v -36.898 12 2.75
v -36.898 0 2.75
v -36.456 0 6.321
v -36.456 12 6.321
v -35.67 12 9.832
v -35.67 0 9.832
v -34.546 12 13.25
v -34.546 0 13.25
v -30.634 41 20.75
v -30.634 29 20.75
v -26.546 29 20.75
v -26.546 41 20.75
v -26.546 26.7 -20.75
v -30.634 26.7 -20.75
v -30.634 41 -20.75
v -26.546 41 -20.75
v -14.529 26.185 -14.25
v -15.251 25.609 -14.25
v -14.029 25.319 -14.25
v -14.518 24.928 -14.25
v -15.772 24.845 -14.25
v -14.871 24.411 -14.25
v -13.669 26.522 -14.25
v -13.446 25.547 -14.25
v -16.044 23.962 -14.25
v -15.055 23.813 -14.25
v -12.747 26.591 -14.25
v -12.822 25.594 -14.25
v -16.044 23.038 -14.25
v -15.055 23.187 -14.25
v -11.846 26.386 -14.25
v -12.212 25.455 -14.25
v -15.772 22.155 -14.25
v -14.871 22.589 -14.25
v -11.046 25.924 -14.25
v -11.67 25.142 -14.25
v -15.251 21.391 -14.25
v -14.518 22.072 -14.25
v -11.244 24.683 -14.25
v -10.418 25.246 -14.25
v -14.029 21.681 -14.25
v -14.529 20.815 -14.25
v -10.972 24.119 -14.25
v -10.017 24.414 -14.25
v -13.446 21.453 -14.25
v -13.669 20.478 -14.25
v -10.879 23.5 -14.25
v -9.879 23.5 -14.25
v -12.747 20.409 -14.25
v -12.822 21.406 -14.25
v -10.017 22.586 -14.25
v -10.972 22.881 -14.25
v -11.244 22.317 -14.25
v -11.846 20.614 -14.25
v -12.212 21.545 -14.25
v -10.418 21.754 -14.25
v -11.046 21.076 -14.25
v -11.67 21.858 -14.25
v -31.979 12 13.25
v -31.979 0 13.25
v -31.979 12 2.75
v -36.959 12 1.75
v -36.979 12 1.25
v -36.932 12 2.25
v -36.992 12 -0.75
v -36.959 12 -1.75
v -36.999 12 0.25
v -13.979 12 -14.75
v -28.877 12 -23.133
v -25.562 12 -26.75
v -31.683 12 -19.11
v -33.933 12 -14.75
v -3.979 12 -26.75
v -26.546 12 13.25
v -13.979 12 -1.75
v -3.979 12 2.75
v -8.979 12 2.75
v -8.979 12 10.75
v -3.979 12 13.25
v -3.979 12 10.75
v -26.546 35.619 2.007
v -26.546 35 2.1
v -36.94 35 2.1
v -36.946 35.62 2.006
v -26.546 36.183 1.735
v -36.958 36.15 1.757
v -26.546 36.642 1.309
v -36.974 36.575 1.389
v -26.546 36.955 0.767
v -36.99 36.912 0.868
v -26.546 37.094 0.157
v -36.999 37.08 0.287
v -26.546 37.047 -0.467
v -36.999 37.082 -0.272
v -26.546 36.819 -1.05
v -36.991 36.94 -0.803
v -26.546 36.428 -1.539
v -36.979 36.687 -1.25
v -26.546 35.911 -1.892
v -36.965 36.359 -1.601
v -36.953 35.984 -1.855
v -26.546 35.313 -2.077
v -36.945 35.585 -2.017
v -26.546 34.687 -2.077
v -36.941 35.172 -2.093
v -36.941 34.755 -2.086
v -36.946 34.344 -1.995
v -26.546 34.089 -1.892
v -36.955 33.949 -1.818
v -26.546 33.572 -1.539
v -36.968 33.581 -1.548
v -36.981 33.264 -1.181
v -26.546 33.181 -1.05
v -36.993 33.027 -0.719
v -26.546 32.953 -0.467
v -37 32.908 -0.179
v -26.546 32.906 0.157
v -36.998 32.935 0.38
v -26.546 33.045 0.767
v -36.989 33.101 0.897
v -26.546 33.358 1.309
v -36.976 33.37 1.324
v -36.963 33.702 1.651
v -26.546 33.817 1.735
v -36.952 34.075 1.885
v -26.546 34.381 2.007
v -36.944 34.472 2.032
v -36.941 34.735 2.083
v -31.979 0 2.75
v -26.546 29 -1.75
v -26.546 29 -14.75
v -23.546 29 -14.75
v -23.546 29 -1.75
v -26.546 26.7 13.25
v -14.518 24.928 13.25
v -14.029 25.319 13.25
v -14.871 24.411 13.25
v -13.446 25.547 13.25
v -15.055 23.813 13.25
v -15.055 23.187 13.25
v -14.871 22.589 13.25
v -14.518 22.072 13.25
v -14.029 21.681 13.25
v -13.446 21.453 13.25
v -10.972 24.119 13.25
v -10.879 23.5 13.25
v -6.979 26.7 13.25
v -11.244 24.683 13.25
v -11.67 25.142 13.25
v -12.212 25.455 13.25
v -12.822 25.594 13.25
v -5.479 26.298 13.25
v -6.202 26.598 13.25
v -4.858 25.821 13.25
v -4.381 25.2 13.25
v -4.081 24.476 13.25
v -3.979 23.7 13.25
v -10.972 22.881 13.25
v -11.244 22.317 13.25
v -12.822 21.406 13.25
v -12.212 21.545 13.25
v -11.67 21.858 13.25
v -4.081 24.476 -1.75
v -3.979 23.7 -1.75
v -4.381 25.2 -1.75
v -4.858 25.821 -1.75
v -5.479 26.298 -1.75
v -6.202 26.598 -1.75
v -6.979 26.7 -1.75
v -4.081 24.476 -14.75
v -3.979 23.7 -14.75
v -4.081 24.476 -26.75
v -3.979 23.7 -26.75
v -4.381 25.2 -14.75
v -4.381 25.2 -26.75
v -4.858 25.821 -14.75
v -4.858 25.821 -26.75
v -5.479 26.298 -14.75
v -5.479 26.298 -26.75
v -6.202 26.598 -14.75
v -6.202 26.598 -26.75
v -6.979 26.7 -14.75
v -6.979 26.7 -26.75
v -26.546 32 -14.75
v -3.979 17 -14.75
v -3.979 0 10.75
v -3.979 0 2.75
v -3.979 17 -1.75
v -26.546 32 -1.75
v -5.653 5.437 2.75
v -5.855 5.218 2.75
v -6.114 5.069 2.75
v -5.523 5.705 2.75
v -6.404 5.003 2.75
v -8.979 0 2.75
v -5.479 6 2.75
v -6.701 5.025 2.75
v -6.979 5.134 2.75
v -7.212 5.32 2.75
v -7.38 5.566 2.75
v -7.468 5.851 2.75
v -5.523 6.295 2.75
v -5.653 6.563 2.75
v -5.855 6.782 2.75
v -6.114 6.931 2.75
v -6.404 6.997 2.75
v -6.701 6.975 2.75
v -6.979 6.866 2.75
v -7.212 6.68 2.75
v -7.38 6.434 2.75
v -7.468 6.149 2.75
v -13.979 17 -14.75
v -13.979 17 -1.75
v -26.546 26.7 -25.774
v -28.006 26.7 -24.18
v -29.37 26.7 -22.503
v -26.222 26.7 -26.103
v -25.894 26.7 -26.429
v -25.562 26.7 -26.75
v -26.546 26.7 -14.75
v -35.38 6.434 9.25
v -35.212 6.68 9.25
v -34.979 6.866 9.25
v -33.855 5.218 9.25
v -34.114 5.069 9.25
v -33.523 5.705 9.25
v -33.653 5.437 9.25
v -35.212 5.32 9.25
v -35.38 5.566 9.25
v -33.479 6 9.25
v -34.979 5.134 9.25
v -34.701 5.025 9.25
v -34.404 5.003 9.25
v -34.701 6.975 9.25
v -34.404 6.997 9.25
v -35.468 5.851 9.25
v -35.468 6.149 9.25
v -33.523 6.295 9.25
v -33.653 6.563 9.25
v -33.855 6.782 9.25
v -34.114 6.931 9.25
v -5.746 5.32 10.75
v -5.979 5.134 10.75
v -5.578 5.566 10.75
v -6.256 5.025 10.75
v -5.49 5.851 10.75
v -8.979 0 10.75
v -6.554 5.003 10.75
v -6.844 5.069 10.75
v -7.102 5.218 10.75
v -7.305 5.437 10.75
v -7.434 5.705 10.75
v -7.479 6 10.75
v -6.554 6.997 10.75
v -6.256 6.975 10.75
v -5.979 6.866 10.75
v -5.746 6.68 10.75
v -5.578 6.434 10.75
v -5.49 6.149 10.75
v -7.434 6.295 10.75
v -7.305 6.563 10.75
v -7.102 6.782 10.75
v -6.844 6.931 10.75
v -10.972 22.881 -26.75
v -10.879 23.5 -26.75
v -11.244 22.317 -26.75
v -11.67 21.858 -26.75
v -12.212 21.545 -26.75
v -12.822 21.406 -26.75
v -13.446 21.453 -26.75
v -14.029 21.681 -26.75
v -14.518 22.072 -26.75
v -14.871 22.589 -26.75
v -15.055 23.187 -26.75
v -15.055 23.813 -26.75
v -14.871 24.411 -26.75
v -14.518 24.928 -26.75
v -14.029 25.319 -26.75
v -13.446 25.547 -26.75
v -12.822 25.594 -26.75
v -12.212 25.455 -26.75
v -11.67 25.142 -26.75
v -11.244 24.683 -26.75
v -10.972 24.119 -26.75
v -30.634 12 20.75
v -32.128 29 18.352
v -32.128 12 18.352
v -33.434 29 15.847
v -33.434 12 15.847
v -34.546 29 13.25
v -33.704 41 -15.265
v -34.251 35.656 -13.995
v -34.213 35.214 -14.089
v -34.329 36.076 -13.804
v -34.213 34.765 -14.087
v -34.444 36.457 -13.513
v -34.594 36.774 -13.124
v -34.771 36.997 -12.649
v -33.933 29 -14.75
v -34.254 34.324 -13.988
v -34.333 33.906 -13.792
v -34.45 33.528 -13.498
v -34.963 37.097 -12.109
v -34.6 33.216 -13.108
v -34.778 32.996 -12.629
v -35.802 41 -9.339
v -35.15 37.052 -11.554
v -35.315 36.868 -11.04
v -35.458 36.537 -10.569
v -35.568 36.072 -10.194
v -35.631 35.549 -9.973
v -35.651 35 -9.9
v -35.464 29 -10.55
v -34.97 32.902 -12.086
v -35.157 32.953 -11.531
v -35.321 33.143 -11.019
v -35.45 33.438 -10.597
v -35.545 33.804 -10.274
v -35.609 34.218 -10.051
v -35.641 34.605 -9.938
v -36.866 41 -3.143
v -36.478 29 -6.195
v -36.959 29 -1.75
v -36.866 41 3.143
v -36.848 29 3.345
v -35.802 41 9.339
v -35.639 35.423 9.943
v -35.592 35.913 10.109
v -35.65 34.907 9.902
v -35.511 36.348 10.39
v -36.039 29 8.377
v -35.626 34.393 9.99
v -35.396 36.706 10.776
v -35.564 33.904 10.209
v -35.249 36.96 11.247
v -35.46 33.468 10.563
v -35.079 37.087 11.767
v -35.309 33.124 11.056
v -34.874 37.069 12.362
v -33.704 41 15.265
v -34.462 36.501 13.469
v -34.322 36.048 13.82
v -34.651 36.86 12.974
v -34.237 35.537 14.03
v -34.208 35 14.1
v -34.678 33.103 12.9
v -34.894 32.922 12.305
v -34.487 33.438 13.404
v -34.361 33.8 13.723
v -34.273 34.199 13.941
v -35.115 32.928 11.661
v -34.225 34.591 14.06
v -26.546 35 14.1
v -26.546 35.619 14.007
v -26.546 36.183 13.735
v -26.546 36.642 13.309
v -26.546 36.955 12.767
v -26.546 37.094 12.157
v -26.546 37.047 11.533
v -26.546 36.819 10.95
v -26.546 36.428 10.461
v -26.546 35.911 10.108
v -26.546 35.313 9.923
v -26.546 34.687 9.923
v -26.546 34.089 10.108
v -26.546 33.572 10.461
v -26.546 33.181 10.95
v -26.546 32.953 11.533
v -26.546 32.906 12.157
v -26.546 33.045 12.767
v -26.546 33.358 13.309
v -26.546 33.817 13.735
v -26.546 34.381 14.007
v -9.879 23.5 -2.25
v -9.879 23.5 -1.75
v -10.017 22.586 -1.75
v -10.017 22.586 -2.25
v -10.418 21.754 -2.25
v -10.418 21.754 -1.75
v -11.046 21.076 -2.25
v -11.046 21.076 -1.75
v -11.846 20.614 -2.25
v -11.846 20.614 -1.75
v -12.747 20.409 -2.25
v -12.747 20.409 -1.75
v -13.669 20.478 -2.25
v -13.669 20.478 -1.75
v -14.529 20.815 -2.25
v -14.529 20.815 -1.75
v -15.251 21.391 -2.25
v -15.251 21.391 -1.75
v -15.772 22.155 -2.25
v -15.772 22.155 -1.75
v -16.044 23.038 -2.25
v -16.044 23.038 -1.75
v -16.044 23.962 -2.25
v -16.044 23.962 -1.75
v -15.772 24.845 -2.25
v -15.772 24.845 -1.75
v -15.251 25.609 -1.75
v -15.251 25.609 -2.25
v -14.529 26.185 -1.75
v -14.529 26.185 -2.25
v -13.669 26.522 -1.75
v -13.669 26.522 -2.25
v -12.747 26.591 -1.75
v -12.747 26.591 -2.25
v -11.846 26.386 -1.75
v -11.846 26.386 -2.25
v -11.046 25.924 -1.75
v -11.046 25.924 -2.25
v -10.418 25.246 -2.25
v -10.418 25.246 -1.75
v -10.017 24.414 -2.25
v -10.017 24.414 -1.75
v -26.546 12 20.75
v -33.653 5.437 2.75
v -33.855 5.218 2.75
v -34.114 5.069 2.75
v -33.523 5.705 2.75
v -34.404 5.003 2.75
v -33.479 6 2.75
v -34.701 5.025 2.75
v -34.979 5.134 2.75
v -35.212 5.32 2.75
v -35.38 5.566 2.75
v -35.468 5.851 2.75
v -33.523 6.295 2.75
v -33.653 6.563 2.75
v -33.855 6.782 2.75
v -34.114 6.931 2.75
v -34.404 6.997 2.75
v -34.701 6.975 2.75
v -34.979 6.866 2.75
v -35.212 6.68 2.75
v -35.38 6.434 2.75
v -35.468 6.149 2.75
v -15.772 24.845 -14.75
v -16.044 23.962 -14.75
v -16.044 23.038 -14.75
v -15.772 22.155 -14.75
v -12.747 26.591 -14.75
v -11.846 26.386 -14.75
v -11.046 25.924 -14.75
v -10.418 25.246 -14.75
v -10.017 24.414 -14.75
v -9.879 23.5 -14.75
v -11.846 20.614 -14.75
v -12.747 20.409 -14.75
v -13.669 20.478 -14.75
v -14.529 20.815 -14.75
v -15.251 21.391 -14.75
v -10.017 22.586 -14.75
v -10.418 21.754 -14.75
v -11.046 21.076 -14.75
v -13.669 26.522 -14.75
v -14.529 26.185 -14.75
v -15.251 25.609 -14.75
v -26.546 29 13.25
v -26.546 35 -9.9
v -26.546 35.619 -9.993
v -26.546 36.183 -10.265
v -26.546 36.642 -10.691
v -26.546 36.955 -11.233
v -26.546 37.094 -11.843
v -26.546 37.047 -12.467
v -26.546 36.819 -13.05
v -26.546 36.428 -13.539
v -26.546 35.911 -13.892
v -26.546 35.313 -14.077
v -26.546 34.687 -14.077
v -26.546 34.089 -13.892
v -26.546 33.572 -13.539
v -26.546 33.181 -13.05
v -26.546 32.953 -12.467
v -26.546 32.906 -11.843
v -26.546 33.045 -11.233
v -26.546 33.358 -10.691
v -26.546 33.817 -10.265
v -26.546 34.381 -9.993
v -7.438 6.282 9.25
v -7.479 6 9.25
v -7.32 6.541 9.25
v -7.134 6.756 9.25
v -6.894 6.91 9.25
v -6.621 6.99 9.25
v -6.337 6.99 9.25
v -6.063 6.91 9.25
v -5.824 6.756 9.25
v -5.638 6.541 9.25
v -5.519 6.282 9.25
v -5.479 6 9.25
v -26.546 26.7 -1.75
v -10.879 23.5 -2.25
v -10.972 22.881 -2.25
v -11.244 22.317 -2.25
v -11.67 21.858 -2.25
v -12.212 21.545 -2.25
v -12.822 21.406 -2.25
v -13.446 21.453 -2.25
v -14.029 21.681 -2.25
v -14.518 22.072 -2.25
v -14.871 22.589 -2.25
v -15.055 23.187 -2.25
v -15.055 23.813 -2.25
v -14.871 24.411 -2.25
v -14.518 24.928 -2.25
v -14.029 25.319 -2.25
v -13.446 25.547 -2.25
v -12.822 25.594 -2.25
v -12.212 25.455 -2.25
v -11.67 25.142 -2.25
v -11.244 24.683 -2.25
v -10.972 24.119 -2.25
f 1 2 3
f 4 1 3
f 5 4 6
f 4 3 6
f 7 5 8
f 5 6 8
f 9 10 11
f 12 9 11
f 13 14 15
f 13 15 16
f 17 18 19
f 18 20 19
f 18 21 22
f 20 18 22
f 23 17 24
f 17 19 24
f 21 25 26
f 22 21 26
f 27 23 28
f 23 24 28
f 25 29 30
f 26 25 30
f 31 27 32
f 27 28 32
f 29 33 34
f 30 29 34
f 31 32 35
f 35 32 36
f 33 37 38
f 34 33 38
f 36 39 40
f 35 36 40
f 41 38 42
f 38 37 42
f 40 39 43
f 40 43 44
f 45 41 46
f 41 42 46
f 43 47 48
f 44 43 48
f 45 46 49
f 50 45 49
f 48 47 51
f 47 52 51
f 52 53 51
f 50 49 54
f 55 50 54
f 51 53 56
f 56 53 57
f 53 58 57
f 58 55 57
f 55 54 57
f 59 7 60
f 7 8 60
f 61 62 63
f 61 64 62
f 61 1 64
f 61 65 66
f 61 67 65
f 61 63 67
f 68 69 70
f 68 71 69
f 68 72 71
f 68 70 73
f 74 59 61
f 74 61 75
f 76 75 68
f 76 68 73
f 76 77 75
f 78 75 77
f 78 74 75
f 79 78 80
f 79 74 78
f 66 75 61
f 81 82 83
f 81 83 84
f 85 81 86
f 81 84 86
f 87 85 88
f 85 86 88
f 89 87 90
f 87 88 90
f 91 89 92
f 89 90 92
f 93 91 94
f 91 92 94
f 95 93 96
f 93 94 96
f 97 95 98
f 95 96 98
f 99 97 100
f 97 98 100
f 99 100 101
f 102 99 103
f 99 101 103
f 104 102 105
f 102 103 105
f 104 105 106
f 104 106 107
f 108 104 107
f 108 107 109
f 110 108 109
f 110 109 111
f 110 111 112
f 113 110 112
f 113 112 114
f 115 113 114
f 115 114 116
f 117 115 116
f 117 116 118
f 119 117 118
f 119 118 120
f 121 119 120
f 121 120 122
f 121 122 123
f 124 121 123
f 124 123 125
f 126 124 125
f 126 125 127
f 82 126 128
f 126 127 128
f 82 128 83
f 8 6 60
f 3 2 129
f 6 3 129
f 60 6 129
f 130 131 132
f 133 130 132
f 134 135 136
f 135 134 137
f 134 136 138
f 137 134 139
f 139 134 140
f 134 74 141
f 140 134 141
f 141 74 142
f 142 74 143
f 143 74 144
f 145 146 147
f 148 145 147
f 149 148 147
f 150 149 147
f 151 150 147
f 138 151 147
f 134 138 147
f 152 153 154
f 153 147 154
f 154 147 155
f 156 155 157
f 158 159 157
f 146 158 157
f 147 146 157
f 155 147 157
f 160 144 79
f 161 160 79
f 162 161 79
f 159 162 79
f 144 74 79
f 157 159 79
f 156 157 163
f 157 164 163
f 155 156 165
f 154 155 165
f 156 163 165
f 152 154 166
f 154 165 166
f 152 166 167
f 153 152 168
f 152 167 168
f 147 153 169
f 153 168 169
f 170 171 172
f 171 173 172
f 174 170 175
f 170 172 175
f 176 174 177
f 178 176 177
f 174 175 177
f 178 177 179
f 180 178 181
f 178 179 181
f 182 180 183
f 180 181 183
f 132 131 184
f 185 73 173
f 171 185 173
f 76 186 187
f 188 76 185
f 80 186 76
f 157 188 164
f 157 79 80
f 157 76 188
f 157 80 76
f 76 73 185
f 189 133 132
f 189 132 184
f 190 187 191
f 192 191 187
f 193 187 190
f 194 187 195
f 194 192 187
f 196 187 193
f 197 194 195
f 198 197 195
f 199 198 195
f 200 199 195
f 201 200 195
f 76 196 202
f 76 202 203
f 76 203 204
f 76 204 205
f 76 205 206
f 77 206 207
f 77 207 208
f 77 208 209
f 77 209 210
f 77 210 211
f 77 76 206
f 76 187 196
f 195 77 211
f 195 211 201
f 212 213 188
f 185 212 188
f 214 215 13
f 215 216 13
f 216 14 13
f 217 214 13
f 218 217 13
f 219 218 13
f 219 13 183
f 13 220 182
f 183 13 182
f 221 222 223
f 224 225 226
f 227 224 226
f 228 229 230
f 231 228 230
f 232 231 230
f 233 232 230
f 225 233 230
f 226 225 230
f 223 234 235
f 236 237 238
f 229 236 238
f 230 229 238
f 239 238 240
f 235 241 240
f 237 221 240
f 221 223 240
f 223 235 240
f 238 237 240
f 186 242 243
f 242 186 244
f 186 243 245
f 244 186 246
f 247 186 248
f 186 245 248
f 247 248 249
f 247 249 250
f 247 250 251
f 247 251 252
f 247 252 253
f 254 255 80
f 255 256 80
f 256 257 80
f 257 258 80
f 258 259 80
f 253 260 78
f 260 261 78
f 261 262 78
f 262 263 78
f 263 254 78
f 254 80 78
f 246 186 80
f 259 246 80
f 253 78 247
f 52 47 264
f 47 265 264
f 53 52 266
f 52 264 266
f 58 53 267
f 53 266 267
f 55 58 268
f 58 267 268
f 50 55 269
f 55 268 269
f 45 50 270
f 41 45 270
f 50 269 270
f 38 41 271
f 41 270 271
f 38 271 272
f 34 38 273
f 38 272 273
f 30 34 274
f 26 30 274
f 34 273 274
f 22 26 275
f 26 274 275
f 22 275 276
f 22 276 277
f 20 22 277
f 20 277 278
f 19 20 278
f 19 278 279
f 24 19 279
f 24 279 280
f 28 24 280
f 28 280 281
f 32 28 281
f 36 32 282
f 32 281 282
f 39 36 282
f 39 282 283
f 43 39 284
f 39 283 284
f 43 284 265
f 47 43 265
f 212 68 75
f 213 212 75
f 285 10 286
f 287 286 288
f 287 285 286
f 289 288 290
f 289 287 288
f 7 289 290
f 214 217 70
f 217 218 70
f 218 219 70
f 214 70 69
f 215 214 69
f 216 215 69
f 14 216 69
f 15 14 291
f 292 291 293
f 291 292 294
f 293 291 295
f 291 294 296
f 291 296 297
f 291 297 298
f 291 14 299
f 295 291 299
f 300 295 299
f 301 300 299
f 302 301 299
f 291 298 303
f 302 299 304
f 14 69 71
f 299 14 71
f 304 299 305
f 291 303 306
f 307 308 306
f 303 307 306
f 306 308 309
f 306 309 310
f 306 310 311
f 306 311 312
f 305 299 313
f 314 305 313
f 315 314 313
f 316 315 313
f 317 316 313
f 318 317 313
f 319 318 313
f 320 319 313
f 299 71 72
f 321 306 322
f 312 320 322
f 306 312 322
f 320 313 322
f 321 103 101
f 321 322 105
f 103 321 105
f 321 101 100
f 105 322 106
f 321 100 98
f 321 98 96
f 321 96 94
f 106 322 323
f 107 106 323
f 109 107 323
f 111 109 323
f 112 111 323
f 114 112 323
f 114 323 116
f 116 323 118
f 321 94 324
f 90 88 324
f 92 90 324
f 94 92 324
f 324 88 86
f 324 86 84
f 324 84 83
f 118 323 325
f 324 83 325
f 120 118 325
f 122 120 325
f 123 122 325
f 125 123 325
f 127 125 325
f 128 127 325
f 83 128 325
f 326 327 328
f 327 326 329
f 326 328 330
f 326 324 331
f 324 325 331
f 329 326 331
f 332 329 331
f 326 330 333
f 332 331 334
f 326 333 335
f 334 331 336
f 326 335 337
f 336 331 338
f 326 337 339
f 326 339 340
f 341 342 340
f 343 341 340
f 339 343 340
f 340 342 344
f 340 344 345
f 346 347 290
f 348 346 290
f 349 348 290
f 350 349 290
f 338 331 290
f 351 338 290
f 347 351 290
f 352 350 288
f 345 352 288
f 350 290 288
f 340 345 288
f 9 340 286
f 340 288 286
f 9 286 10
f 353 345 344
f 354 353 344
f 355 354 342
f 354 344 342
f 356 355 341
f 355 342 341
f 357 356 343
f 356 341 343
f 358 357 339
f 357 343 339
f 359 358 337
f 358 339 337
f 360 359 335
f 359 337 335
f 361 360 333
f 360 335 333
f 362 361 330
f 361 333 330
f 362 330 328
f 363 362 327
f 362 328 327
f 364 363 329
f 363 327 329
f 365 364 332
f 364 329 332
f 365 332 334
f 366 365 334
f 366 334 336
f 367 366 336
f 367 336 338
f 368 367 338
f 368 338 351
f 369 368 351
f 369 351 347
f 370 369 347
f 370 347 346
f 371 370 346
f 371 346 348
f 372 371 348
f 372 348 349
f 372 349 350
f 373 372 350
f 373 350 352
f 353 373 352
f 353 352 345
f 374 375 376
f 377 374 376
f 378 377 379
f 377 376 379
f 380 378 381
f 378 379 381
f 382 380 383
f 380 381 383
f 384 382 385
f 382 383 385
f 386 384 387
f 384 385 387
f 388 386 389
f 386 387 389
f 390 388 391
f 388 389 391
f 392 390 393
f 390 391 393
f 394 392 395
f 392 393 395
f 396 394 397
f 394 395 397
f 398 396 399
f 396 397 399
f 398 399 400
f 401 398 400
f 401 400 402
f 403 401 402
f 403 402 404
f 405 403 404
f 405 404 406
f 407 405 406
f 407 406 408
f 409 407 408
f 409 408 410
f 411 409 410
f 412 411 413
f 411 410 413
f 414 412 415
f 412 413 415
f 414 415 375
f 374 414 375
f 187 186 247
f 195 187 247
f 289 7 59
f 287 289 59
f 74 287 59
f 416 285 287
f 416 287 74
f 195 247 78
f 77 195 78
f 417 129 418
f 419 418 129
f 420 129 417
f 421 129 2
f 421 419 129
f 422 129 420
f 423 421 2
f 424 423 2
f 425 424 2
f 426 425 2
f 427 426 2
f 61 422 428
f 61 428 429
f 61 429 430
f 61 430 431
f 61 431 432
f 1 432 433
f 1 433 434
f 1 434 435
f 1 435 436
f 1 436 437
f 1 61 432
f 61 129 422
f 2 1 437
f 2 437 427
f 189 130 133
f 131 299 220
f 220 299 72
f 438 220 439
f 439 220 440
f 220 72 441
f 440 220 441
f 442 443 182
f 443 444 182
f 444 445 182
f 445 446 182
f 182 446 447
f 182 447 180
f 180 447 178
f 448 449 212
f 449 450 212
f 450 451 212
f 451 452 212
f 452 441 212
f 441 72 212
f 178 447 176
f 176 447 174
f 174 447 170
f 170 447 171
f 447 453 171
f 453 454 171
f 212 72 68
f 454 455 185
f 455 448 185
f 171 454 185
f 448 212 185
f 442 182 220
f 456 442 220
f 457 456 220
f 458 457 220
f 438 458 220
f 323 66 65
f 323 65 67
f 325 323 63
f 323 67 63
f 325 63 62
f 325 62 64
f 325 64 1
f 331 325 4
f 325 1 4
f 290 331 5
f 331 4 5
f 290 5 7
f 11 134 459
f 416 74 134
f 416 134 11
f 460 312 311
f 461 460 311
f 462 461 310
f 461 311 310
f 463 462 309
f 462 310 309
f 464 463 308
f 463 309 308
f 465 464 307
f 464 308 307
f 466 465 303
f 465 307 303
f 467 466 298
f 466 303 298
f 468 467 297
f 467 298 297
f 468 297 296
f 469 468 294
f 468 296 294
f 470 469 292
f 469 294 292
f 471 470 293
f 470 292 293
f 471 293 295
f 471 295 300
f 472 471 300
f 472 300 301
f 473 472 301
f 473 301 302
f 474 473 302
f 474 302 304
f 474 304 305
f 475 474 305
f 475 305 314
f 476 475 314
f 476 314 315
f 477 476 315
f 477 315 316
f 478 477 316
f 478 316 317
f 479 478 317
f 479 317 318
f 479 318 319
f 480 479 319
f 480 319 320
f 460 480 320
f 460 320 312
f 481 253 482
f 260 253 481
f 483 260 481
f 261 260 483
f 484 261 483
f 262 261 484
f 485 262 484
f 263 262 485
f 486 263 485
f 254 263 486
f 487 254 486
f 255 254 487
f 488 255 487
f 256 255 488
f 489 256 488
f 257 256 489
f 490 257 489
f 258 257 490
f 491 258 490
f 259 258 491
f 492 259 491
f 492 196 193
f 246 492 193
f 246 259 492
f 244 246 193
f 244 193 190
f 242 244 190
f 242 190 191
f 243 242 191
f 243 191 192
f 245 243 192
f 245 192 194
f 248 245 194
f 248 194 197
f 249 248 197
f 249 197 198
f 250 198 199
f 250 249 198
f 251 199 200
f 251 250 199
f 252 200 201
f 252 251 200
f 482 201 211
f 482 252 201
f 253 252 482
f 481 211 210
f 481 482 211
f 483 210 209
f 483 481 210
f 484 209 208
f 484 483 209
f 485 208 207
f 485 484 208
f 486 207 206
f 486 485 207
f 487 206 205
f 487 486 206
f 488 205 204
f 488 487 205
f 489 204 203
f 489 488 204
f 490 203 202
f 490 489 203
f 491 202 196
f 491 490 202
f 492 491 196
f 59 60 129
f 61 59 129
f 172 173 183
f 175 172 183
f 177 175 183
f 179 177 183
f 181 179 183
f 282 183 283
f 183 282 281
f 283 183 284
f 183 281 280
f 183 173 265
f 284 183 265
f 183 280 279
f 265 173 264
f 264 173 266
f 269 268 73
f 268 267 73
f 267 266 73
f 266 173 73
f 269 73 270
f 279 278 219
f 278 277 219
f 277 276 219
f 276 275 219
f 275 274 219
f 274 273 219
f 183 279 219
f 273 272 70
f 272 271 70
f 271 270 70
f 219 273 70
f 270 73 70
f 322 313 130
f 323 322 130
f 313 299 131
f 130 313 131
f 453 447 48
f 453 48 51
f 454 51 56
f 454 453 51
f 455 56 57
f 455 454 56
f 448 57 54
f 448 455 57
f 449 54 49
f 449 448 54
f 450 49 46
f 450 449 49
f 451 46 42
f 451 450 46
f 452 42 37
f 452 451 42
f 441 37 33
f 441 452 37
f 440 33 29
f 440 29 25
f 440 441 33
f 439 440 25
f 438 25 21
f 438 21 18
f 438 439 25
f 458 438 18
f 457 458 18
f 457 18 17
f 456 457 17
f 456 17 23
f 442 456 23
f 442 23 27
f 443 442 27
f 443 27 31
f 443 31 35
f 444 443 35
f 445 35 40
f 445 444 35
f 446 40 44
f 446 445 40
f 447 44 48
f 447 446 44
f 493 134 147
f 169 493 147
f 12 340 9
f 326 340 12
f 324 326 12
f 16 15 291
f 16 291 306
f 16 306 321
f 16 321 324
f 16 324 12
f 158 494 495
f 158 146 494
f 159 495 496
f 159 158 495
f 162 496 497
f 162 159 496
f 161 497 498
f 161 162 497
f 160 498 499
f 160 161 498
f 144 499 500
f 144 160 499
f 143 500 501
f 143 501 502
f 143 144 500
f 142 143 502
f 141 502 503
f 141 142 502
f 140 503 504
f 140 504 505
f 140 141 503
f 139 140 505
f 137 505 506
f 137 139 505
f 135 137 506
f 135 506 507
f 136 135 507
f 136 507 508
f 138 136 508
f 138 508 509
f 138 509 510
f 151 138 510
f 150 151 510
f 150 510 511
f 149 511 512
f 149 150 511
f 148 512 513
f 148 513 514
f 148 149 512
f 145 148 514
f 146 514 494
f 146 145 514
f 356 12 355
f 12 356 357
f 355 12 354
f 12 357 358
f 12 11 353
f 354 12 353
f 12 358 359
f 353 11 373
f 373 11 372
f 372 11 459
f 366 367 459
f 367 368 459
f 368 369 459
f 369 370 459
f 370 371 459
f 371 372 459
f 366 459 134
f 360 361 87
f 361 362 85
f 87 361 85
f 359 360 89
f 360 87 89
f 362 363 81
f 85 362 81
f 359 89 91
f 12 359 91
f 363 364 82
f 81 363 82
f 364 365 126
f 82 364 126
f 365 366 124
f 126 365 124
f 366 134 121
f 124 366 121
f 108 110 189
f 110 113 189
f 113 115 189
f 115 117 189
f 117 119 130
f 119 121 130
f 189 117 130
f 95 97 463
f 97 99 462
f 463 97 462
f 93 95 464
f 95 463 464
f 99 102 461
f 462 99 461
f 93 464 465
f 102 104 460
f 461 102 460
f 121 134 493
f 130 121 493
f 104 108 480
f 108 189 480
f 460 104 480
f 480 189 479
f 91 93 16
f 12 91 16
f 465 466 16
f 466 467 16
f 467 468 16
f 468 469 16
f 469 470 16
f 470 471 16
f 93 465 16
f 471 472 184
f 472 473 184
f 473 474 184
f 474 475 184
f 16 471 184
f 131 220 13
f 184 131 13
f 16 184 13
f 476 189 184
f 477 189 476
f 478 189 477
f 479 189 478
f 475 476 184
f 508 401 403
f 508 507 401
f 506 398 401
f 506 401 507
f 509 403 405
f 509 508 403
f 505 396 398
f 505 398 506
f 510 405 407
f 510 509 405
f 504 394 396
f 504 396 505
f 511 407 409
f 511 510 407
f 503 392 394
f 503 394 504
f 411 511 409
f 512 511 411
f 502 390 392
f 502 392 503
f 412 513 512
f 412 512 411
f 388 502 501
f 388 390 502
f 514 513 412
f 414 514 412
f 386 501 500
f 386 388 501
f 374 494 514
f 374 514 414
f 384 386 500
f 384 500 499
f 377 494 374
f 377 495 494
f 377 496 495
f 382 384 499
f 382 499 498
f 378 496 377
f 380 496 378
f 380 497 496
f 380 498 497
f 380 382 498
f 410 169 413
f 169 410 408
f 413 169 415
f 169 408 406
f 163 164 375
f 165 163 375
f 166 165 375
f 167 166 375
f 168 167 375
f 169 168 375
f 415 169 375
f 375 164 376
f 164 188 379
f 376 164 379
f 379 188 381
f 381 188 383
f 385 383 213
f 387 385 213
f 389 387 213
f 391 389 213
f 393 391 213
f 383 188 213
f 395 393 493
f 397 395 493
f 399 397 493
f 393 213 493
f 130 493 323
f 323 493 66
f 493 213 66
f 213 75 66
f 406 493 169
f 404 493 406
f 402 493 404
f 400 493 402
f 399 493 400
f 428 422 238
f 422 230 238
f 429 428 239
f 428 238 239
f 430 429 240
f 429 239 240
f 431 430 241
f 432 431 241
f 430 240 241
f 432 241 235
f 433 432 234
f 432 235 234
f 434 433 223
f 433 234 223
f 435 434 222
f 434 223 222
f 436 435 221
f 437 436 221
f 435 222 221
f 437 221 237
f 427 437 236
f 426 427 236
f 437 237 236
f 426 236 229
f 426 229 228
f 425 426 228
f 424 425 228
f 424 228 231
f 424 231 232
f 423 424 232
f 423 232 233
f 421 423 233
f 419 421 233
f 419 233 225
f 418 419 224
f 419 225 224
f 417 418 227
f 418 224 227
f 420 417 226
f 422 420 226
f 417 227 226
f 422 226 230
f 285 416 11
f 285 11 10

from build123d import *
from build123d.topology import SkipClean

# Parameters (mm, degrees)
BOSS_EXTRUDE1_DEPTH       = 12
SKETCH1_W                 = 5
SKETCH1_H                 = 8
BOSS_EXTRUDE1_2_DEPTH     = 12
BOSS_EXTRUDE2_DEPTH       = 17
F_2_0MM_DOWEL_HOLE1_D     = 2
F_2_0MM_DOWEL_HOLE1_DEPTH = 8
BOSS_EXTRUDE6_START       = -17
BOSS_EXTRUDE6_DEPTH       = 17
BOSS_EXTRUDE8_DEPTH       = 12
CUT_EXTRUDE2_REACH        = 70.191
SKETCH5_R                 = 2.1
CUT_EXTRUDE3_REACH        = 70.191
SKETCH19_W                = 22.567285658
SKETCH19_H                = 2.3
CUT_EXTRUDE5_START        = -2.3
CUT_EXTRUDE5_DEPTH        = 2.3
SKETCH21_W                = 10
SKETCH21_H                = 13
BOSS_EXTRUDE10_DEPTH      = 5
FILLET3_R                 = 3
SKETCH23_R                = 3.1
SKETCH23_R_2              = 2.1
BOSS_EXTRUDE11_DEPTH      = 0.5
CUT_EXTRUDE6_START        = -1.5
SKETCH24_W                = 5
SKETCH24_H                = 12
SKETCH24_R                = 1
CUT_EXTRUDE6_DEPTH        = 1.5
BOSS_EXTRUDE12_START      = -9.5
SKETCH24_2_W              = 5
SKETCH24_2_H              = 12
SKETCH24_2_R              = 1
BOSS_EXTRUDE12_DEPTH      = 1.5
F_2_0MM_DOWEL_HOLE2_D     = 4.2
BOSS_EXTRUDE13_START      = 17
BOSS_EXTRUDE13_DEPTH      = 17
BOSS_EXTRUDE14_DEPTH      = 13


with BuildPart() as part:
    # Sketch1 → Boss-Extrude1 (new body)
    with BuildSketch(Plane(origin=(0, 0, 0), x_dir=(1, 0, 0), z_dir=(0, 1, 0))):
        with BuildLine():
            Line((-31.978879107, -1.25), (-36.978879107, -1.25))
            ThreePointArc((-36.978879107, -1.25), (-36.262349279, -7.351328095), (-34.546164765, -13.25))
            Line((-34.546164765, -13.25), (-31.978879107, -13.25))
            Line((-31.978879107, -13.25), (-31.978879107, -1.25))
        make_face()
    extrude(amount=BOSS_EXTRUDE1_DEPTH)



with BuildPart() as body_2:
    # Sketch1 → Boss-Extrude1 2 (new body)
    with BuildSketch(Plane(origin=(0, 0, 0), x_dir=(1, 0, 0), z_dir=(0, 1, 0))):
        with Locations((-6.478879107, -5.25)):
            Rectangle(SKETCH1_W, SKETCH1_H)
    extrude(amount=BOSS_EXTRUDE1_2_DEPTH)


with BuildPart() as part_1:
    add(part.part)

    add(body_2.part)  # Boss-Extrude2 merges body 2
    # Sketch2 → Boss-Extrude2 (add)
    with BuildSketch(Plane(origin=(0, 12, 0), x_dir=(1, 0, 0), z_dir=(0, 1, 0))):
        with BuildLine():
            Line((-3.978879107, -13.25), (-3.978879107, 1.75))
            Line((-3.978879107, 1.75), (-36.958591694, 1.75))
            ThreePointArc((-36.958591694, 1.75), (-36.530570062, -5.875155396), (-34.546164765, -13.25))
            Line((-34.546164765, -13.25), (-3.978879107, -13.25))
        make_face()
    extrude(amount=BOSS_EXTRUDE2_DEPTH)

    # Ø2.0mm Dowel Hole1
    with Locations(Plane(origin=(0, 0, 1.25), x_dir=(-1, 0, 0), z_dir=(0, 0, -1))):
        with Locations((6.478879107, 6), (34.478879107, 6)):
            Hole(F_2_0MM_DOWEL_HOLE1_D / 2, depth=F_2_0MM_DOWEL_HOLE1_DEPTH)



with BuildPart() as body_2_2:
    # Sketch13 → Boss-Extrude6 (new body)
    with BuildSketch(Plane(origin=(0, 29, 0), x_dir=(1, 0, 0), z_dir=(0, 1, 0)).offset(BOSS_EXTRUDE6_START)):
        with BuildLine():
            Line((-33.932838078, 14.75), (-24.958591694, 14.75))
            Line((-24.958591694, 14.75), (-3.978879107, 14.75))
            Line((-3.978879107, 14.75), (-3.978879107, 26.75))
            Line((-3.978879107, 26.75), (-25.562423594, 26.75))
            ThreePointArc((-25.562423594, 26.75), (-30.346689117, 21.167863843), (-33.932838078, 14.75))
        make_face()
    extrude(amount=BOSS_EXTRUDE6_DEPTH)


with BuildPart() as part_2:
    add(part_1.part)

    add(body_2_2.part)  # Boss-Extrude8 merges body 2 2
    # Sketch17 → Boss-Extrude8 (add)
    with BuildSketch(Plane(origin=(0, 29, 0), x_dir=(1, 0, 0), z_dir=(0, 1, 0))):
        with BuildLine():
            Line((-26.546164765, -20.75), (-26.546164765, 20.75))
            Line((-26.546164765, 20.75), (-30.63392727, 20.75))
            ThreePointArc((-30.63392727, 20.75), (-37, 0), (-30.63392727, -20.75))
            Line((-30.63392727, -20.75), (-26.546164765, -20.75))
        make_face()
    extrude(amount=BOSS_EXTRUDE8_DEPTH)

    # Cut-Extrude2: up to this face of the body (flat: up to its plane)
    cut_extrude2_end = Plane(part_2.part.faces().sort_by_distance((-14.77065135, 20.5, -26.75))[0])
    # Sketch5 → Cut-Extrude2 (cut, up to the picked face)
    with BuildSketch(Plane.XY.offset(13.25), mode=Mode.PRIVATE) as cut_extrude2_sk1:
        with Locations((-12.978879107, 23.5)):
            Circle(SKETCH5_R)
    cut_extrude2_tool1 = split(extrude(cut_extrude2_sk1.sketch, amount=-CUT_EXTRUDE2_REACH, mode=Mode.PRIVATE), bisect_by=cut_extrude2_end, keep=Keep.BOTH, mode=Mode.PRIVATE)
    add(cut_extrude2_tool1.solids().sort_by(Axis((-12.978879, 23.5, 13.25), (0, 0, -1)))[0], mode=Mode.SUBTRACT)

    # Cut-Extrude3: up to this face of the body (flat: up to its plane)
    cut_extrude3_end = Plane(part_2.part.faces().sort_by_distance((-14.840961104, 20.382278978, -26.75))[0])
    # Sketch19 → Cut-Extrude3 (cut, up to the picked face)
    with BuildSketch(Plane.XY.offset(13.25), mode=Mode.PRIVATE) as cut_extrude3_sk1:
        with Locations((-15.262521936, 27.85)):
            Rectangle(SKETCH19_W, SKETCH19_H)
    cut_extrude3_tool1 = split(extrude(cut_extrude3_sk1.sketch, amount=-CUT_EXTRUDE3_REACH, mode=Mode.PRIVATE), bisect_by=cut_extrude3_end, keep=Keep.BOTH, mode=Mode.PRIVATE)
    add(cut_extrude3_tool1.solids().sort_by(Axis((-15.262522, 27.85, 13.25), (0, 0, -1)))[0], mode=Mode.SUBTRACT)

    # Sketch22 → Cut-Extrude5 (cut)
    with BuildSketch(Plane(origin=(0, 29, 0), x_dir=(1, 0, 0), z_dir=(0, 1, 0)).offset(CUT_EXTRUDE5_START)):
        with BuildLine():
            Line((-26.546164765, 20.75), (-26.546164765, 25.774039968))
            ThreePointArc((-26.546164765, 25.774039968), (-28.700191214, 23.351638578), (-30.63392727, 20.75))
            Line((-30.63392727, 20.75), (-26.546164765, 20.75))
        make_face()
    extrude(amount=CUT_EXTRUDE5_DEPTH, mode=Mode.SUBTRACT)

    # Sketch21 → Boss-Extrude10 (add)
    with BuildSketch(Plane.XZ.offset(-12)):
        with Locations((-8.978879107, -8.25)):
            Rectangle(SKETCH21_W, SKETCH21_H)
    extrude(amount=-BOSS_EXTRUDE10_DEPTH)

    # Fillet3
    fillet3_edges = [part_2.edges().sort_by_distance(p)[0] for p in [
        (-3.978879107, 26.7, -20.75),
        (-3.978879107, 26.7, 5.75),
    ]]
    fillet(fillet3_edges, radius=FILLET3_R)

    # Sketch23 → Boss-Extrude11 (add)
    with BuildSketch(Plane(origin=(0, 0, -1.75), x_dir=(-1, 0, 0), z_dir=(0, 0, -1))):
        with Locations(Location((12.978879107, 23.5, 0), (0, 0, 180))):
            Circle(SKETCH23_R)
        with Locations(Location((12.978879107, 23.5, 0), (0, 0, 180))):
            Circle(SKETCH23_R_2, mode=Mode.SUBTRACT)
    boss_extrude11 = extrude(amount=BOSS_EXTRUDE11_DEPTH)

    # Mirror4: Boss-Extrude11 across plane
    add(boss_extrude11.mirror(Plane.XY.offset(-8.25)))

    # Sketch24 → Cut-Extrude6 (cut)
    # profile 1 of 2: a face of its own
    with BuildSketch(Plane(origin=(0, 0, 1.25), x_dir=(-1, 0, 0), z_dir=(0, 0, -1)).offset(CUT_EXTRUDE6_START)):
        with Locations((34.478879107, 6)):
            Rectangle(SKETCH24_W, SKETCH24_H)
        with Locations((34.478879107, 6)):
            Circle(SKETCH24_R, mode=Mode.SUBTRACT)
    # profile 2 of 2: a face of its own
    with BuildSketch(Plane(origin=(0, 0, 1.25), x_dir=(-1, 0, 0), z_dir=(0, 0, -1)).offset(CUT_EXTRUDE6_START)):
        with Locations((6.478879107, 6)):
            Rectangle(SKETCH24_W, SKETCH24_H)
        with Locations((6.478879107, 6)):
            Circle(SKETCH24_R, mode=Mode.SUBTRACT)
    extrude(amount=CUT_EXTRUDE6_DEPTH, mode=Mode.SUBTRACT)

    # Sketch24<2> → Boss-Extrude12 (add)
    with BuildSketch(Plane(origin=(0, 0, 1.25), x_dir=(-1, 0, 0), z_dir=(0, 0, -1)).offset(BOSS_EXTRUDE12_START)):
        with Locations((6.478879107, 6)):
            Rectangle(SKETCH24_2_W, SKETCH24_2_H)
        with Locations((6.478879107, 6)):
            Circle(SKETCH24_2_R, mode=Mode.SUBTRACT)
    extrude(amount=BOSS_EXTRUDE12_DEPTH)

    # Ø2.0mm Dowel Hole2 (through all)
    with Locations(Plane(origin=(-26.546164765, 0, 0), x_dir=(0, 0, -1), z_dir=(1, 0, 0))):
        with Locations((-12, 35), (0, 35), (12, 35)):
            Hole(F_2_0MM_DOWEL_HOLE2_D / 2)

    # Sketch27 → Boss-Extrude13 (add)
    with SkipClean():  # the faces are left unmerged after this step: merging them gives an invalid solid
        with BuildSketch(Plane.XZ.offset(-29).offset(BOSS_EXTRUDE13_START)):
            with BuildLine():
                Line((-34.546164765, 13.25), (-26.546164765, 13.25))
                Line((-26.546164765, 13.25), (-26.546164765, 20.75))
                Line((-26.546164765, 20.75), (-30.63392727, 20.75))
                ThreePointArc((-30.63392727, 20.75), (-32.805084963, 17.112171123), (-34.546164765, 13.25))
            make_face()
        extrude(amount=-BOSS_EXTRUDE13_DEPTH)

    # Sketch28 → Boss-Extrude14 (add)
    with SkipClean():  # the faces are left unmerged after this step: merging them gives an invalid solid
        with BuildSketch(Plane(origin=(0, 0, -1.75), x_dir=(-1, 0, 0), z_dir=(0, 0, -1))):
            Polygon((26.546164765, 29), (23.546164765, 29), (26.546164765, 32), align=None)
        extrude(amount=BOSS_EXTRUDE14_DEPTH)


solid = part_2.part
